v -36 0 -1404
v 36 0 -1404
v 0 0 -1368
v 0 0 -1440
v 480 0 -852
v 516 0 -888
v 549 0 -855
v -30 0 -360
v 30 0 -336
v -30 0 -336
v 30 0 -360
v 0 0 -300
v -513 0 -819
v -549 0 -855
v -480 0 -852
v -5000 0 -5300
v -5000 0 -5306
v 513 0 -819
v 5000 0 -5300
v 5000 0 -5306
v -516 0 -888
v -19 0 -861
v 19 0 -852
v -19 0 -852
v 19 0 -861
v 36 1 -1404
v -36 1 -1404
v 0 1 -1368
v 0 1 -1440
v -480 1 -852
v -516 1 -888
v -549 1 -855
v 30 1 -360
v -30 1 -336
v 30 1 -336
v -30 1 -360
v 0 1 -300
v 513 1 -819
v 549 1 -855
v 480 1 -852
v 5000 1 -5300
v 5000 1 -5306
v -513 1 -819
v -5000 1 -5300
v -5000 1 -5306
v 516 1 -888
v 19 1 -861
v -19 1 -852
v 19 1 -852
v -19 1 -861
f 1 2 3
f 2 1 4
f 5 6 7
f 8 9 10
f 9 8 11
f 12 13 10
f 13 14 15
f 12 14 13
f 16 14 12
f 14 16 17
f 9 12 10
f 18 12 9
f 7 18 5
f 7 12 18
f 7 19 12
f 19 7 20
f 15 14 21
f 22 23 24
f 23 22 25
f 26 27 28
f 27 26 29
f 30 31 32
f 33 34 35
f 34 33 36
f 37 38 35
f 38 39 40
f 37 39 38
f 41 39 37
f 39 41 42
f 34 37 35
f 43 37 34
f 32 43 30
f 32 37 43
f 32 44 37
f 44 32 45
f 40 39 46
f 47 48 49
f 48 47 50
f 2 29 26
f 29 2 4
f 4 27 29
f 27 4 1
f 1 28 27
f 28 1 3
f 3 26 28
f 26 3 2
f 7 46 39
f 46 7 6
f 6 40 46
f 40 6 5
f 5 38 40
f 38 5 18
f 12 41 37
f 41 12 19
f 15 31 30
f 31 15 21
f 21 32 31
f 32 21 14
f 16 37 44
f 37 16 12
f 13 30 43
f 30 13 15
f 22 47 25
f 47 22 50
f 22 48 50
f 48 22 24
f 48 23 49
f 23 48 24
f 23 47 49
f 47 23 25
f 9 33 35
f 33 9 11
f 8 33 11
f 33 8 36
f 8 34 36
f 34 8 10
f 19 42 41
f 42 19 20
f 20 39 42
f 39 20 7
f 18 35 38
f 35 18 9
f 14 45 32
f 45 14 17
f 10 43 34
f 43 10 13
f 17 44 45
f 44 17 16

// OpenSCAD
$fs = 120;

$vpt = [0,1080,480];
$vpr = [-34,0,0];
$vpf = 45;

foul_line = 6;
plain_color = [1,1,1,0.8];
out_color = [1,0.75,0.75,0.8];
eat_color = [0.5,0.75,1,0.8];

// home, first, second, third, rubber
color([1,1,1]) scale([1,-1,-1]) rotate([90,0,0]) linear_extrude(1) {
    polygon([[-30,30*2+300],[30,30*2+300],[30,30+300],[0,300],[-30,30+300]]);
    polygon([[552-36*2,852],[552-36,852+36],[552,852],[552-36,852-36]]);
    polygon([[0,1404+36],[36,1404],[0,1404-36],[-36,1404]]);
    polygon([[-552+36*2,852],[-552+36,852+36],[-552,852],[-552+36,852-36]]);
    polygon([[-19,852],[19,852],[19,9+852],[-19,9+852]]);
}

// foul lines
color([1,1,1,0.5]) scale([1,-1,-1]) rotate([90,0,0]) linear_extrude(1) {
    polygon([[0,300],[-5000,300+5000],[-5000,300+5000+foul_line],[0,300+foul_line]]);
    polygon([[0,300],[5000,300+5000],[5000,300+5000+foul_line],[0,300+foul_line]]);
}

scale([0.1,0.1,-0.1]) translate([-23200,0,0]) {
    color(out_color) polyhedron([[10890,0,13040],[40710,0,42630],[10890,10000,13040],[40710,10000,42630]], [[0,1,3,2]]);
    color(out_color) polyhedron([[10890,0,13040],[10890,0,13140],[10890,10000,13040],[10890,10000,13140]], [[0,1,3,2]]);
    color(out_color) polyhedron([[40710,0,42630],[40710,0,42730],[40710,10000,42630],[40710,10000,42730]], [[0,1,3,2]]);
    color(out_color) polyhedron([[10890,0,13140],[40710,0,42730],[10890,10000,13140],[40710,10000,42730]], [[0,1,3,2]]);
    color(out_color) polyhedron([[10890,10000,13040],[10890,10000,13140],[40710,10000,42630],[40710,10000,42730]], [[0,1,3,2]]);
    color(plain_color) polyhedron([[19670,0,16560],[33580,0,29730],[19670,4083,16560],[33580,4083,29730]], [[0,1,3,2]]);
    color(plain_color) polyhedron([[19670,0,16560],[15260,0,21410],[19670,4083,16560],[15260,4083,21410]], [[0,1,3,2]]);
    color(plain_color) polyhedron([[33580,0,29730],[24510,0,29290],[33580,4083,29730],[24510,4083,29290]], [[0,1,3,2]]);
    color(plain_color) polyhedron([[15260,0,21410],[24510,0,29290],[15260,4083,21410],[24510,4083,29290]], [[0,1,3,2]]);
    color(plain_color) polyhedron([[19670,4083,16560],[15260,4083,21410],[33580,4083,29730],[24510,4083,29290]], [[0,1,3,2]]);
    color(plain_color) polyhedron([[27410,0,22160],[31740,0,26870],[27410,2300,22160],[31740,2300,26870]], [[0,1,3,2]]);
    color(plain_color) polyhedron([[27410,0,22160],[26340,0,23630],[27410,2300,22160],[26340,2300,23630]], [[0,1,3,2]]);
    color(plain_color) polyhedron([[31740,0,26870],[30760,0,29430],[31740,2300,26870],[30760,2300,29430]], [[0,1,3,2]]);
    color(plain_color) polyhedron([[26340,0,23630],[30760,0,29430],[26340,2300,23630],[30760,2300,29430]], [[0,1,3,2]]);
    color(plain_color) polyhedron([[27410,2300,22160],[26340,2300,23630],[31740,2300,26870],[30760,2300,29430]], [[0,1,3,2]]);
    color(out_color) polyhedron([[36990,0,17060],[37090,0,17060],[36990,10000,17060],[37090,10000,17060]], [[0,1,3,2]]);
    color(out_color) polyhedron([[36990,0,17060],[10390,0,42630],[36990,10000,17060],[10390,10000,42630]], [[0,1,3,2]]);
    color(out_color) polyhedron([[37090,0,17060],[10290,0,42630],[37090,10000,17060],[10290,10000,42630]], [[0,1,3,2]]);
    color(out_color) polyhedron([[10390,0,42630],[10290,0,42630],[10390,10000,42630],[10290,10000,42630]], [[0,1,3,2]]);
    color(out_color) polyhedron([[36990,10000,17060],[10390,10000,42630],[37090,10000,17060],[10290,10000,42630]], [[0,1,3,2]]);
    color(plain_color) polyhedron([[27410,0,22160],[32850,0,16800],[27410,2000,22160],[32850,2000,16800]], [[0,1,3,2]]);
    color(plain_color) polyhedron([[27410,0,22160],[31740,0,26870],[27410,2000,22160],[31740,2000,26870]], [[0,1,3,2]]);
    color(plain_color) polyhedron([[32850,0,16800],[34720,0,19120],[32850,2000,16800],[34720,2000,19120]], [[0,1,3,2]]);
    color(plain_color) polyhedron([[31740,0,26870],[34720,0,19120],[31740,2000,26870],[34720,2000,19120]], [[0,1,3,2]]);
    color(plain_color) polyhedron([[27410,2000,22160],[31740,2000,26870],[32850,2000,16800],[34720,2000,19120]], [[0,1,3,2]]);
    color(plain_color) polyhedron([[35720,0,13800],[38660,0,16120],[35720,1400,13800],[38660,1400,16120]], [[0,1,3,2]]);
    color(plain_color) polyhedron([[35720,0,13800],[32850,0,16800],[35720,1400,13800],[32850,1400,16800]], [[0,1,3,2]]);
    color(plain_color) polyhedron([[38660,0,16120],[34720,0,19120],[38660,1400,16120],[34720,1400,19120]], [[0,1,3,2]]);
    color(plain_color) polyhedron([[32850,0,16800],[34720,0,19120],[32850,1400,16800],[34720,1400,19120]], [[0,1,3,2]]);
    color(plain_color) polyhedron([[35720,1400,13800],[32850,1400,16800],[38660,1400,16120],[34720,1400,19120]], [[0,1,3,2]]);
    color(plain_color) polyhedron([[30230,0,5340],[37260,0,12570],[30230,1300,5340],[37260,1300,12570]], [[0,1,3,2]]);
    color(plain_color) polyhedron([[30230,0,5340],[29440,0,8170],[30230,1300,5340],[29440,1300,8170]], [[0,1,3,2]]);
    color(plain_color) polyhedron([[37260,0,12570],[35250,0,13900],[37260,1300,12570],[35250,1300,13900]], [[0,1,3,2]]);
    color(plain_color) polyhedron([[29440,0,8170],[35250,0,13900],[29440,1300,8170],[35250,1300,13900]], [[0,1,3,2]]);
    color(plain_color) polyhedron([[30230,1300,5340],[29440,1300,8170],[37260,1300,12570],[35250,1300,13900]], [[0,1,3,2]]);
    color(plain_color) polyhedron([[29420,0,4410],[30230,0,5340],[29420,1300,4410],[30230,1300,5340]], [[0,1,3,2]]);
    color(plain_color) polyhedron([[29420,0,4410],[28520,0,6350],[29420,1300,4410],[28520,1300,6350]], [[0,1,3,2]]);
    color(plain_color) polyhedron([[30230,0,5340],[29440,0,8170],[30230,1300,5340],[29440,1300,8170]], [[0,1,3,2]]);
    color(plain_color) polyhedron([[28520,0,6350],[29440,0,8170],[28520,1300,6350],[29440,1300,8170]], [[0,1,3,2]]);
    color(plain_color) polyhedron([[29420,1300,4410],[28520,1300,6350],[30230,1300,5340],[29440,1300,8170]], [[0,1,3,2]]);
    color(out_color) polyhedron([[22580,0,1880],[22680,0,1880],[22580,1200,1880],[22680,1200,1880]], [[0,1,3,2]]);
    color(out_color) polyhedron([[22580,0,1880],[12710,0,11920],[22580,1200,1880],[12710,1200,11920]], [[0,1,3,2]]);
    color(out_color) polyhedron([[22680,0,1880],[12810,0,11920],[22680,1200,1880],[12810,1200,11920]], [[0,1,3,2]]);
    color(out_color) polyhedron([[12710,0,11920],[12810,0,11920],[12710,1200,11920],[12810,1200,11920]], [[0,1,3,2]]);
    color(out_color) polyhedron([[22580,1200,1880],[12710,1200,11920],[22680,1200,1880],[12810,1200,11920]], [[0,1,3,2]]);
    color(out_color) polyhedron([[12710,0,11920],[12810,0,11920],[12710,1200,11920],[12810,1200,11920]], [[0,1,3,2]]);
    color(out_color) polyhedron([[12710,0,11920],[10450,0,14230],[12710,1200,11920],[10450,1200,14230]], [[0,1,3,2]]);
    color(out_color) polyhedron([[12810,0,11920],[10350,0,14230],[12810,1200,11920],[10350,1200,14230]], [[0,1,3,2]]);
    color(out_color) polyhedron([[10450,0,14230],[10350,0,14230],[10450,1200,14230],[10350,1200,14230]], [[0,1,3,2]]);
    color(out_color) polyhedron([[12710,1200,11920],[10450,1200,14230],[12810,1200,11920],[10350,1200,14230]], [[0,1,3,2]]);
    color(out_color) polyhedron([[24620,0,1770],[35000,0,11630],[24620,5,1770],[35000,5,11630]], [[0,1,3,2]]);
    color(out_color) polyhedron([[24620,0,1770],[24620,0,1880],[24620,5,1770],[24620,5,1880]], [[0,1,3,2]]);
    color(out_color) polyhedron([[35000,0,11630],[35000,0,11730],[35000,5,11630],[35000,5,11730]], [[0,1,3,2]]);
    color(out_color) polyhedron([[24620,0,1880],[35000,0,11730],[24620,5,1880],[35000,5,11730]], [[0,1,3,2]]);
    color(out_color) polyhedron([[24620,5,1770],[24620,5,1880],[35000,5,11630],[35000,5,11730]], [[0,1,3,2]]);
    color(plain_color) polyhedron([[0,0,0],[0,0,0],[0,0,0],[0,0,0]], [[0,1,3,2]]);
    color(plain_color) polyhedron([[0,0,0],[0,0,0],[0,0,0],[0,0,0]], [[0,1,3,2]]);
    color(plain_color) polyhedron([[0,0,0],[0,0,0],[0,0,0],[0,0,0]], [[0,1,3,2]]);
    color(plain_color) polyhedron([[0,0,0],[0,0,0],[0,0,0],[0,0,0]], [[0,1,3,2]]);
    color(plain_color) polyhedron([[0,0,0],[0,0,0],[0,0,0],[0,0,0]], [[0,1,3,2]]);
    color(plain_color) polyhedron([[0,0,0],[0,0,0],[0,0,0],[0,0,0]], [[0,1,3,2]]);
    color(plain_color) polyhedron([[0,0,0],[0,0,0],[0,0,0],[0,0,0]], [[0,1,3,2]]);
    color(plain_color) polyhedron([[0,0,0],[0,0,0],[0,0,0],[0,0,0]], [[0,1,3,2]]);
    color(plain_color) polyhedron([[0,0,0],[0,0,0],[0,0,0],[0,0,0]], [[0,1,3,2]]);
    color(plain_color) polyhedron([[0,0,0],[0,0,0],[0,0,0],[0,0,0]], [[0,1,3,2]]);
    color(plain_color) polyhedron([[0,0,0],[0,0,0],[0,0,0],[0,0,0]], [[0,1,3,2]]);
    color(plain_color) polyhedron([[0,0,0],[0,0,0],[0,0,0],[0,0,0]], [[0,1,3,2]]);
    color(plain_color) polyhedron([[0,0,0],[0,0,0],[0,0,0],[0,0,0]], [[0,1,3,2]]);
    color(plain_color) polyhedron([[0,0,0],[0,0,0],[0,0,0],[0,0,0]], [[0,1,3,2]]);
    color(plain_color) polyhedron([[0,0,0],[0,0,0],[0,0,0],[0,0,0]], [[0,1,3,2]]);
    color(plain_color) polyhedron([[0,0,0],[0,0,0],[0,0,0],[0,0,0]], [[0,1,3,2]]);
    color(plain_color) polyhedron([[0,0,0],[0,0,0],[0,0,0],[0,0,0]], [[0,1,3,2]]);
    color(plain_color) polyhedron([[0,0,0],[0,0,0],[0,0,0],[0,0,0]], [[0,1,3,2]]);
    color(plain_color) polyhedron([[0,0,0],[0,0,0],[0,0,0],[0,0,0]], [[0,1,3,2]]);
    color(plain_color) polyhedron([[0,0,0],[0,0,0],[0,0,0],[0,0,0]], [[0,1,3,2]]);
    color(plain_color) polyhedron([[0,0,0],[0,0,0],[0,0,0],[0,0,0]], [[0,1,3,2]]);
    color(plain_color) polyhedron([[0,0,0],[0,0,0],[0,0,0],[0,0,0]], [[0,1,3,2]]);
    color(plain_color) polyhedron([[0,0,0],[0,0,0],[0,0,0],[0,0,0]], [[0,1,3,2]]);
    color(plain_color) polyhedron([[0,0,0],[0,0,0],[0,0,0],[0,0,0]], [[0,1,3,2]]);
    color(plain_color) polyhedron([[0,0,0],[0,0,0],[0,0,0],[0,0,0]], [[0,1,3,2]]);
    color(plain_color) polyhedron([[0,0,0],[0,0,0],[0,0,0],[0,0,0]], [[0,1,3,2]]);
    color(plain_color) polyhedron([[0,0,0],[0,0,0],[0,0,0],[0,0,0]], [[0,1,3,2]]);
    color(plain_color) polyhedron([[0,0,0],[0,0,0],[0,0,0],[0,0,0]], [[0,1,3,2]]);
    color(plain_color) polyhedron([[0,0,0],[0,0,0],[0,0,0],[0,0,0]], [[0,1,3,2]]);
    color(plain_color) polyhedron([[0,0,0],[0,0,0],[0,0,0],[0,0,0]], [[0,1,3,2]]);
    color(plain_color) polyhedron([[0,0,0],[0,0,0],[0,0,0],[0,0,0]], [[0,1,3,2]]);
    color(plain_color) polyhedron([[0,0,0],[0,0,0],[0,0,0],[0,0,0]], [[0,1,3,2]]);
    color(plain_color) polyhedron([[0,0,0],[0,0,0],[0,0,0],[0,0,0]], [[0,1,3,2]]);
    color(plain_color) polyhedron([[0,0,0],[0,0,0],[0,0,0],[0,0,0]], [[0,1,3,2]]);
    color(plain_color) polyhedron([[0,0,0],[0,0,0],[0,0,0],[0,0,0]], [[0,1,3,2]]);
    color(plain_color) polyhedron([[0,0,0],[0,0,0],[0,0,0],[0,0,0]], [[0,1,3,2]]);
    color(plain_color) polyhedron([[0,0,0],[0,0,0],[0,0,0],[0,0,0]], [[0,1,3,2]]);
    color(plain_color) polyhedron([[0,0,0],[0,0,0],[0,0,0],[0,0,0]], [[0,1,3,2]]);
    color(plain_color) polyhedron([[0,0,0],[0,0,0],[0,0,0],[0,0,0]], [[0,1,3,2]]);
    color(plain_color) polyhedron([[0,0,0],[0,0,0],[0,0,0],[0,0,0]], [[0,1,3,2]]);
    color(plain_color) polyhedron([[0,0,0],[0,0,0],[0,0,0],[0,0,0]], [[0,1,3,2]]);
    color(plain_color) polyhedron([[0,0,0],[0,0,0],[0,0,0],[0,0,0]], [[0,1,3,2]]);
    color(plain_color) polyhedron([[0,0,0],[0,0,0],[0,0,0],[0,0,0]], [[0,1,3,2]]);
    color(plain_color) polyhedron([[0,0,0],[0,0,0],[0,0,0],[0,0,0]], [[0,1,3,2]]);
    color(plain_color) polyhedron([[0,0,0],[0,0,0],[0,0,0],[0,0,0]], [[0,1,3,2]]);
    color(plain_color) polyhedron([[0,0,0],[0,0,0],[0,0,0],[0,0,0]], [[0,1,3,2]]);
    color(plain_color) polyhedron([[0,0,0],[0,0,0],[0,0,0],[0,0,0]], [[0,1,3,2]]);
    color(plain_color) polyhedron([[0,0,0],[0,0,0],[0,0,0],[0,0,0]], [[0,1,3,2]]);
    color(plain_color) polyhedron([[0,0,0],[0,0,0],[0,0,0],[0,0,0]], [[0,1,3,2]]);
    color(plain_color) polyhedron([[0,0,0],[0,0,0],[0,0,0],[0,0,0]], [[0,1,3,2]]);
    color(plain_color) polyhedron([[0,0,0],[0,0,0],[0,0,0],[0,0,0]], [[0,1,3,2]]);
    color(plain_color) polyhedron([[0,0,0],[0,0,0],[0,0,0],[0,0,0]], [[0,1,3,2]]);
    color(plain_color) polyhedron([[0,0,0],[0,0,0],[0,0,0],[0,0,0]], [[0,1,3,2]]);
    color(plain_color) polyhedron([[0,0,0],[0,0,0],[0,0,0],[0,0,0]], [[0,1,3,2]]);
    color(plain_color) polyhedron([[0,0,0],[0,0,0],[0,0,0],[0,0,0]], [[0,1,3,2]]);
    color(plain_color) polyhedron([[0,0,0],[0,0,0],[0,0,0],[0,0,0]], [[0,1,3,2]]);
    color(plain_color) polyhedron([[0,0,0],[0,0,0],[0,0,0],[0,0,0]], [[0,1,3,2]]);
    color(plain_color) polyhedron([[0,0,0],[0,0,0],[0,0,0],[0,0,0]], [[0,1,3,2]]);
    color(plain_color) polyhedron([[0,0,0],[0,0,0],[0,0,0],[0,0,0]], [[0,1,3,2]]);
    color(plain_color) polyhedron([[0,0,0],[0,0,0],[0,0,0],[0,0,0]], [[0,1,3,2]]);
    color(plain_color) polyhedron([[0,0,0],[0,0,0],[0,0,0],[0,0,0]], [[0,1,3,2]]);
    color(plain_color) polyhedron([[0,0,0],[0,0,0],[0,0,0],[0,0,0]], [[0,1,3,2]]);
    color(plain_color) polyhedron([[0,0,0],[0,0,0],[0,0,0],[0,0,0]], [[0,1,3,2]]);
    color(plain_color) polyhedron([[0,0,0],[0,0,0],[0,0,0],[0,0,0]], [[0,1,3,2]]);
    color(plain_color) polyhedron([[0,0,0],[0,0,0],[0,0,0],[0,0,0]], [[0,1,3,2]]);
    color(plain_color) polyhedron([[0,0,0],[0,0,0],[0,0,0],[0,0,0]], [[0,1,3,2]]);
    color(plain_color) polyhedron([[0,0,0],[0,0,0],[0,0,0],[0,0,0]], [[0,1,3,2]]);
    color(plain_color) polyhedron([[0,0,0],[0,0,0],[0,0,0],[0,0,0]], [[0,1,3,2]]);
    color(plain_color) polyhedron([[0,0,0],[0,0,0],[0,0,0],[0,0,0]], [[0,1,3,2]]);
    color(plain_color) polyhedron([[0,0,0],[0,0,0],[0,0,0],[0,0,0]], [[0,1,3,2]]);
    color(plain_color) polyhedron([[0,0,0],[0,0,0],[0,0,0],[0,0,0]], [[0,1,3,2]]);
    color(plain_color) polyhedron([[0,0,0],[0,0,0],[0,0,0],[0,0,0]], [[0,1,3,2]]);
    color(plain_color) polyhedron([[0,0,0],[0,0,0],[0,0,0],[0,0,0]], [[0,1,3,2]]);
    color(plain_color) polyhedron([[0,0,0],[0,0,0],[0,0,0],[0,0,0]], [[0,1,3,2]]);
    color(plain_color) polyhedron([[0,0,0],[0,0,0],[0,0,0],[0,0,0]], [[0,1,3,2]]);
    color(plain_color) polyhedron([[0,0,0],[0,0,0],[0,0,0],[0,0,0]], [[0,1,3,2]]);
    color(plain_color) polyhedron([[0,0,0],[0,0,0],[0,0,0],[0,0,0]], [[0,1,3,2]]);
    color(plain_color) polyhedron([[0,0,0],[0,0,0],[0,0,0],[0,0,0]], [[0,1,3,2]]);
    color(plain_color) polyhedron([[0,0,0],[0,0,0],[0,0,0],[0,0,0]], [[0,1,3,2]]);
    color(plain_color) polyhedron([[0,0,0],[0,0,0],[0,0,0],[0,0,0]], [[0,1,3,2]]);
    color(plain_color) polyhedron([[0,0,0],[0,0,0],[0,0,0],[0,0,0]], [[0,1,3,2]]);
    color(plain_color) polyhedron([[0,0,0],[0,0,0],[0,0,0],[0,0,0]], [[0,1,3,2]]);
    color(plain_color) polyhedron([[0,0,0],[0,0,0],[0,0,0],[0,0,0]], [[0,1,3,2]]);
    color(plain_color) polyhedron([[0,0,0],[0,0,0],[0,0,0],[0,0,0]], [[0,1,3,2]]);
    color(plain_color) polyhedron([[0,0,0],[0,0,0],[0,0,0],[0,0,0]], [[0,1,3,2]]);
    color(plain_color) polyhedron([[0,0,0],[0,0,0],[0,0,0],[0,0,0]], [[0,1,3,2]]);
    color(plain_color) polyhedron([[0,0,0],[0,0,0],[0,0,0],[0,0,0]], [[0,1,3,2]]);
    color(plain_color) polyhedron([[0,0,0],[0,0,0],[0,0,0],[0,0,0]], [[0,1,3,2]]);
    color(plain_color) polyhedron([[0,0,0],[0,0,0],[0,0,0],[0,0,0]], [[0,1,3,2]]);
    color(plain_color) polyhedron([[0,0,0],[0,0,0],[0,0,0],[0,0,0]], [[0,1,3,2]]);
    color(plain_color) polyhedron([[0,0,0],[0,0,0],[0,0,0],[0,0,0]], [[0,1,3,2]]);
    color(plain_color) polyhedron([[0,0,0],[0,0,0],[0,0,0],[0,0,0]], [[0,1,3,2]]);
    color(plain_color) polyhedron([[0,0,0],[0,0,0],[0,0,0],[0,0,0]], [[0,1,3,2]]);
    color(plain_color) polyhedron([[0,0,0],[0,0,0],[0,0,0],[0,0,0]], [[0,1,3,2]]);
    color(plain_color) polyhedron([[0,0,0],[0,0,0],[0,0,0],[0,0,0]], [[0,1,3,2]]);
    color(plain_color) polyhedron([[0,0,0],[0,0,0],[0,0,0],[0,0,0]], [[0,1,3,2]]);
    color(plain_color) polyhedron([[0,0,0],[0,0,0],[0,0,0],[0,0,0]], [[0,1,3,2]]);
    color(plain_color) polyhedron([[0,0,0],[0,0,0],[0,0,0],[0,0,0]], [[0,1,3,2]]);
    color(plain_color) polyhedron([[0,0,0],[0,0,0],[0,0,0],[0,0,0]], [[0,1,3,2]]);
    color(plain_color) polyhedron([[0,0,0],[0,0,0],[0,0,0],[0,0,0]], [[0,1,3,2]]);
    color(plain_color) polyhedron([[0,0,0],[0,0,0],[0,0,0],[0,0,0]], [[0,1,3,2]]);
    color(plain_color) polyhedron([[0,0,0],[0,0,0],[0,0,0],[0,0,0]], [[0,1,3,2]]);
    color(plain_color) polyhedron([[0,0,0],[0,0,0],[0,0,0],[0,0,0]], [[0,1,3,2]]);
    color(plain_color) polyhedron([[0,0,0],[0,0,0],[0,0,0],[0,0,0]], [[0,1,3,2]]);
    color(plain_color) polyhedron([[0,0,0],[0,0,0],[0,0,0],[0,0,0]], [[0,1,3,2]]);
    color(plain_color) polyhedron([[0,0,0],[0,0,0],[0,0,0],[0,0,0]], [[0,1,3,2]]);
    color(plain_color) polyhedron([[0,0,0],[0,0,0],[0,0,0],[0,0,0]], [[0,1,3,2]]);
    color(plain_color) polyhedron([[0,0,0],[0,0,0],[0,0,0],[0,0,0]], [[0,1,3,2]]);
    color(plain_color) polyhedron([[0,0,0],[0,0,0],[0,0,0],[0,0,0]], [[0,1,3,2]]);
    color(plain_color) polyhedron([[0,0,0],[0,0,0],[0,0,0],[0,0,0]], [[0,1,3,2]]);
    color(plain_color) polyhedron([[0,0,0],[0,0,0],[0,0,0],[0,0,0]], [[0,1,3,2]]);
    color(plain_color) polyhedron([[0,0,0],[0,0,0],[0,0,0],[0,0,0]], [[0,1,3,2]]);
    color(plain_color) polyhedron([[0,0,0],[0,0,0],[0,0,0],[0,0,0]], [[0,1,3,2]]);
    color(plain_color) polyhedron([[0,0,0],[0,0,0],[0,0,0],[0,0,0]], [[0,1,3,2]]);
    color(plain_color) polyhedron([[0,0,0],[0,0,0],[0,0,0],[0,0,0]], [[0,1,3,2]]);
    color(plain_color) polyhedron([[0,0,0],[0,0,0],[0,0,0],[0,0,0]], [[0,1,3,2]]);
    color(plain_color) polyhedron([[0,0,0],[0,0,0],[0,0,0],[0,0,0]], [[0,1,3,2]]);
    color(plain_color) polyhedron([[0,0,0],[0,0,0],[0,0,0],[0,0,0]], [[0,1,3,2]]);
    color(plain_color) polyhedron([[0,0,0],[0,0,0],[0,0,0],[0,0,0]], [[0,1,3,2]]);
    color(plain_color) polyhedron([[0,0,0],[0,0,0],[0,0,0],[0,0,0]], [[0,1,3,2]]);
    color(plain_color) polyhedron([[0,0,0],[0,0,0],[0,0,0],[0,0,0]], [[0,1,3,2]]);
    color(plain_color) polyhedron([[0,0,0],[0,0,0],[0,0,0],[0,0,0]], [[0,1,3,2]]);
    color(plain_color) polyhedron([[0,0,0],[0,0,0],[0,0,0],[0,0,0]], [[0,1,3,2]]);
    color(plain_color) polyhedron([[0,0,0],[0,0,0],[0,0,0],[0,0,0]], [[0,1,3,2]]);
    color(plain_color) polyhedron([[0,0,0],[0,0,0],[0,0,0],[0,0,0]], [[0,1,3,2]]);
    color(plain_color) polyhedron([[0,0,0],[0,0,0],[0,0,0],[0,0,0]], [[0,1,3,2]]);
    color(plain_color) polyhedron([[0,0,0],[0,0,0],[0,0,0],[0,0,0]], [[0,1,3,2]]);
    color(plain_color) polyhedron([[0,0,0],[0,0,0],[0,0,0],[0,0,0]], [[0,1,3,2]]);
    color(plain_color) polyhedron([[0,0,0],[0,0,0],[0,0,0],[0,0,0]], [[0,1,3,2]]);
    color(plain_color) polyhedron([[0,0,0],[0,0,0],[0,0,0],[0,0,0]], [[0,1,3,2]]);
    color(plain_color) polyhedron([[0,0,0],[0,0,0],[0,0,0],[0,0,0]], [[0,1,3,2]]);
    color(plain_color) polyhedron([[0,0,0],[0,0,0],[0,0,0],[0,0,0]], [[0,1,3,2]]);
    color(plain_color) polyhedron([[0,0,0],[0,0,0],[0,0,0],[0,0,0]], [[0,1,3,2]]);
    color(plain_color) polyhedron([[0,0,0],[0,0,0],[0,0,0],[0,0,0]], [[0,1,3,2]]);
    color(plain_color) polyhedron([[0,0,0],[0,0,0],[0,0,0],[0,0,0]], [[0,1,3,2]]);
    color(plain_color) polyhedron([[0,0,0],[0,0,0],[0,0,0],[0,0,0]], [[0,1,3,2]]);
    color(plain_color) polyhedron([[0,0,0],[0,0,0],[0,0,0],[0,0,0]], [[0,1,3,2]]);
    color(plain_color) polyhedron([[0,0,0],[0,0,0],[0,0,0],[0,0,0]], [[0,1,3,2]]);
    color(plain_color) polyhedron([[0,0,0],[0,0,0],[0,0,0],[0,0,0]], [[0,1,3,2]]);
    color(plain_color) polyhedron([[0,0,0],[0,0,0],[0,0,0],[0,0,0]], [[0,1,3,2]]);
    color(plain_color) polyhedron([[0,0,0],[0,0,0],[0,0,0],[0,0,0]], [[0,1,3,2]]);
    color(plain_color) polyhedron([[0,0,0],[0,0,0],[0,0,0],[0,0,0]], [[0,1,3,2]]);
    color(plain_color) polyhedron([[0,0,0],[0,0,0],[0,0,0],[0,0,0]], [[0,1,3,2]]);
    color(plain_color) polyhedron([[0,0,0],[0,0,0],[0,0,0],[0,0,0]], [[0,1,3,2]]);
    color(plain_color) polyhedron([[0,0,0],[0,0,0],[0,0,0],[0,0,0]], [[0,1,3,2]]);
    color(plain_color) polyhedron([[0,0,0],[0,0,0],[0,0,0],[0,0,0]], [[0,1,3,2]]);
    color(plain_color) polyhedron([[0,0,0],[0,0,0],[0,0,0],[0,0,0]], [[0,1,3,2]]);
    color(plain_color) polyhedron([[0,0,0],[0,0,0],[0,0,0],[0,0,0]], [[0,1,3,2]]);
    color(plain_color) polyhedron([[0,0,0],[0,0,0],[0,0,0],[0,0,0]], [[0,1,3,2]]);
    color(plain_color) polyhedron([[0,0,0],[0,0,0],[0,0,0],[0,0,0]], [[0,1,3,2]]);
    color(plain_color) polyhedron([[0,0,0],[0,0,0],[0,0,0],[0,0,0]], [[0,1,3,2]]);
    color(plain_color) polyhedron([[0,0,0],[0,0,0],[0,0,0],[0,0,0]], [[0,1,3,2]]);
    color(plain_color) polyhedron([[0,0,0],[0,0,0],[0,0,0],[0,0,0]], [[0,1,3,2]]);
    color(plain_color) polyhedron([[0,0,0],[0,0,0],[0,0,0],[0,0,0]], [[0,1,3,2]]);
    color(plain_color) polyhedron([[0,0,0],[0,0,0],[0,0,0],[0,0,0]], [[0,1,3,2]]);
    color(plain_color) polyhedron([[0,0,0],[0,0,0],[0,0,0],[0,0,0]], [[0,1,3,2]]);
    color(plain_color) polyhedron([[0,0,0],[0,0,0],[0,0,0],[0,0,0]], [[0,1,3,2]]);
    color(plain_color) polyhedron([[0,0,0],[0,0,0],[0,0,0],[0,0,0]], [[0,1,3,2]]);
    color(plain_color) polyhedron([[0,0,0],[0,0,0],[0,0,0],[0,0,0]], [[0,1,3,2]]);
    color(plain_color) polyhedron([[0,0,0],[0,0,0],[0,0,0],[0,0,0]], [[0,1,3,2]]);
    color(plain_color) polyhedron([[0,0,0],[0,0,0],[0,0,0],[0,0,0]], [[0,1,3,2]]);
    color(plain_color) polyhedron([[0,0,0],[0,0,0],[0,0,0],[0,0,0]], [[0,1,3,2]]);
    color(plain_color) polyhedron([[0,0,0],[0,0,0],[0,0,0],[0,0,0]], [[0,1,3,2]]);
    color(plain_color) polyhedron([[0,0,0],[0,0,0],[0,0,0],[0,0,0]], [[0,1,3,2]]);
    color(plain_color) polyhedron([[0,0,0],[0,0,0],[0,0,0],[0,0,0]], [[0,1,3,2]]);
    color(plain_color) polyhedron([[0,0,0],[0,0,0],[0,0,0],[0,0,0]], [[0,1,3,2]]);
    color(plain_color) polyhedron([[0,0,0],[0,0,0],[0,0,0],[0,0,0]], [[0,1,3,2]]);
    color(plain_color) polyhedron([[0,0,0],[0,0,0],[0,0,0],[0,0,0]], [[0,1,3,2]]);
    color(plain_color) polyhedron([[0,0,0],[0,0,0],[0,0,0],[0,0,0]], [[0,1,3,2]]);
    color(plain_color) polyhedron([[0,0,0],[0,0,0],[0,0,0],[0,0,0]], [[0,1,3,2]]);
    color(plain_color) polyhedron([[0,0,0],[0,0,0],[0,0,0],[0,0,0]], [[0,1,3,2]]);
    color(plain_color) polyhedron([[0,0,0],[0,0,0],[0,0,0],[0,0,0]], [[0,1,3,2]]);
    color(plain_color) polyhedron([[0,0,0],[0,0,0],[0,0,0],[0,0,0]], [[0,1,3,2]]);
    color(plain_color) polyhedron([[0,0,0],[0,0,0],[0,0,0],[0,0,0]], [[0,1,3,2]]);
    color(plain_color) polyhedron([[0,0,0],[0,0,0],[0,0,0],[0,0,0]], [[0,1,3,2]]);
    color(plain_color) polyhedron([[0,0,0],[0,0,0],[0,0,0],[0,0,0]], [[0,1,3,2]]);
    color(plain_color) polyhedron([[0,0,0],[0,0,0],[0,0,0],[0,0,0]], [[0,1,3,2]]);
    color(plain_color) polyhedron([[0,0,0],[0,0,0],[0,0,0],[0,0,0]], [[0,1,3,2]]);
    color(plain_color) polyhedron([[0,0,0],[0,0,0],[0,0,0],[0,0,0]], [[0,1,3,2]]);
    color(plain_color) polyhedron([[0,0,0],[0,0,0],[0,0,0],[0,0,0]], [[0,1,3,2]]);
    color(plain_color) polyhedron([[0,0,0],[0,0,0],[0,0,0],[0,0,0]], [[0,1,3,2]]);
    color(plain_color) polyhedron([[0,0,0],[0,0,0],[0,0,0],[0,0,0]], [[0,1,3,2]]);
    color(plain_color) polyhedron([[0,0,0],[0,0,0],[0,0,0],[0,0,0]], [[0,1,3,2]]);
    color(plain_color) polyhedron([[0,0,0],[0,0,0],[0,0,0],[0,0,0]], [[0,1,3,2]]);
    color(plain_color) polyhedron([[0,0,0],[0,0,0],[0,0,0],[0,0,0]], [[0,1,3,2]]);
    color(plain_color) polyhedron([[0,0,0],[0,0,0],[0,0,0],[0,0,0]], [[0,1,3,2]]);
    color(plain_color) polyhedron([[0,0,0],[0,0,0],[0,0,0],[0,0,0]], [[0,1,3,2]]);
    color(plain_color) polyhedron([[0,0,0],[0,0,0],[0,0,0],[0,0,0]], [[0,1,3,2]]);
    color(plain_color) polyhedron([[0,0,0],[0,0,0],[0,0,0],[0,0,0]], [[0,1,3,2]]);
    color(plain_color) polyhedron([[0,0,0],[0,0,0],[0,0,0],[0,0,0]], [[0,1,3,2]]);
    color(plain_color) polyhedron([[0,0,0],[0,0,0],[0,0,0],[0,0,0]], [[0,1,3,2]]);
    color(plain_color) polyhedron([[0,0,0],[0,0,0],[0,0,0],[0,0,0]], [[0,1,3,2]]);
    color(plain_color) polyhedron([[0,0,0],[0,0,0],[0,0,0],[0,0,0]], [[0,1,3,2]]);
    color(plain_color) polyhedron([[0,0,0],[0,0,0],[0,0,0],[0,0,0]], [[0,1,3,2]]);
    color(plain_color) polyhedron([[0,0,0],[0,0,0],[0,0,0],[0,0,0]], [[0,1,3,2]]);
    color(plain_color) polyhedron([[0,0,0],[0,0,0],[0,0,0],[0,0,0]], [[0,1,3,2]]);
    color(plain_color) polyhedron([[0,0,0],[0,0,0],[0,0,0],[0,0,0]], [[0,1,3,2]]);
    color(plain_color) polyhedron([[0,0,0],[0,0,0],[0,0,0],[0,0,0]], [[0,1,3,2]]);
    color(plain_color) polyhedron([[0,0,0],[0,0,0],[0,0,0],[0,0,0]], [[0,1,3,2]]);
    color(plain_color) polyhedron([[0,0,0],[0,0,0],[0,0,0],[0,0,0]], [[0,1,3,2]]);
    color(plain_color) polyhedron([[0,0,0],[0,0,0],[0,0,0],[0,0,0]], [[0,1,3,2]]);
    color(plain_color) polyhedron([[0,0,0],[0,0,0],[0,0,0],[0,0,0]], [[0,1,3,2]]);
    color(plain_color) polyhedron([[0,0,0],[0,0,0],[0,0,0],[0,0,0]], [[0,1,3,2]]);
    color(plain_color) polyhedron([[0,0,0],[0,0,0],[0,0,0],[0,0,0]], [[0,1,3,2]]);
    color(plain_color) polyhedron([[0,0,0],[0,0,0],[0,0,0],[0,0,0]], [[0,1,3,2]]);
    color(plain_color) polyhedron([[0,0,0],[0,0,0],[0,0,0],[0,0,0]], [[0,1,3,2]]);
    color(plain_color) polyhedron([[0,0,0],[0,0,0],[0,0,0],[0,0,0]], [[0,1,3,2]]);
    color(plain_color) polyhedron([[0,0,0],[0,0,0],[0,0,0],[0,0,0]], [[0,1,3,2]]);
    color(plain_color) polyhedron([[0,0,0],[0,0,0],[0,0,0],[0,0,0]], [[0,1,3,2]]);
    color(plain_color) polyhedron([[0,0,0],[0,0,0],[0,0,0],[0,0,0]], [[0,1,3,2]]);
    color(plain_color) polyhedron([[0,0,0],[0,0,0],[0,0,0],[0,0,0]], [[0,1,3,2]]);
    color(plain_color) polyhedron([[0,0,0],[0,0,0],[0,0,0],[0,0,0]], [[0,1,3,2]]);
    color(plain_color) polyhedron([[0,0,0],[0,0,0],[0,0,0],[0,0,0]], [[0,1,3,2]]);
    color(plain_color) polyhedron([[0,0,0],[0,0,0],[0,0,0],[0,0,0]], [[0,1,3,2]]);
    color(plain_color) polyhedron([[0,0,0],[0,0,0],[0,0,0],[0,0,0]], [[0,1,3,2]]);
    color(plain_color) polyhedron([[0,0,0],[0,0,0],[0,0,0],[0,0,0]], [[0,1,3,2]]);
    color(plain_color) polyhedron([[0,0,0],[0,0,0],[0,0,0],[0,0,0]], [[0,1,3,2]]);
    color(plain_color) polyhedron([[0,0,0],[0,0,0],[0,0,0],[0,0,0]], [[0,1,3,2]]);
    color(plain_color) polyhedron([[0,0,0],[0,0,0],[0,0,0],[0,0,0]], [[0,1,3,2]]);
    color(plain_color) polyhedron([[0,0,0],[0,0,0],[0,0,0],[0,0,0]], [[0,1,3,2]]);
    color(plain_color) polyhedron([[0,0,0],[0,0,0],[0,0,0],[0,0,0]], [[0,1,3,2]]);
    color(plain_color) polyhedron([[0,0,0],[0,0,0],[0,0,0],[0,0,0]], [[0,1,3,2]]);
    color(plain_color) polyhedron([[0,0,0],[0,0,0],[0,0,0],[0,0,0]], [[0,1,3,2]]);
    color(plain_color) polyhedron([[0,0,0],[0,0,0],[0,0,0],[0,0,0]], [[0,1,3,2]]);
    color(plain_color) polyhedron([[0,0,0],[0,0,0],[0,0,0],[0,0,0]], [[0,1,3,2]]);
    color(plain_color) polyhedron([[0,0,0],[0,0,0],[0,0,0],[0,0,0]], [[0,1,3,2]]);
    color(plain_color) polyhedron([[0,0,0],[0,0,0],[0,0,0],[0,0,0]], [[0,1,3,2]]);
    color(plain_color) polyhedron([[0,0,0],[0,0,0],[0,0,0],[0,0,0]], [[0,1,3,2]]);
    color(plain_color) polyhedron([[0,0,0],[0,0,0],[0,0,0],[0,0,0]], [[0,1,3,2]]);
    color(plain_color) polyhedron([[0,0,0],[0,0,0],[0,0,0],[0,0,0]], [[0,1,3,2]]);
    color(plain_color) polyhedron([[0,0,0],[0,0,0],[0,0,0],[0,0,0]], [[0,1,3,2]]);
    color(plain_color) polyhedron([[0,0,0],[0,0,0],[0,0,0],[0,0,0]], [[0,1,3,2]]);
    color(plain_color) polyhedron([[0,0,0],[0,0,0],[0,0,0],[0,0,0]], [[0,1,3,2]]);
    color(plain_color) polyhedron([[0,0,0],[0,0,0],[0,0,0],[0,0,0]], [[0,1,3,2]]);
    color(plain_color) polyhedron([[0,0,0],[0,0,0],[0,0,0],[0,0,0]], [[0,1,3,2]]);
    color(plain_color) polyhedron([[0,0,0],[0,0,0],[0,0,0],[0,0,0]], [[0,1,3,2]]);
    color(plain_color) polyhedron([[0,0,0],[0,0,0],[0,0,0],[0,0,0]], [[0,1,3,2]]);
    color(plain_color) polyhedron([[0,0,0],[0,0,0],[0,0,0],[0,0,0]], [[0,1,3,2]]);
    color(plain_color) polyhedron([[0,0,0],[0,0,0],[0,0,0],[0,0,0]], [[0,1,3,2]]);
    color(plain_color) polyhedron([[0,0,0],[0,0,0],[0,0,0],[0,0,0]], [[0,1,3,2]]);
    color(plain_color) polyhedron([[0,0,0],[0,0,0],[0,0,0],[0,0,0]], [[0,1,3,2]]);
    color(plain_color) polyhedron([[0,0,0],[0,0,0],[0,0,0],[0,0,0]], [[0,1,3,2]]);
    color(plain_color) polyhedron([[0,0,0],[0,0,0],[0,0,0],[0,0,0]], [[0,1,3,2]]);
    color(plain_color) polyhedron([[0,0,0],[0,0,0],[0,0,0],[0,0,0]], [[0,1,3,2]]);
    color(plain_color) polyhedron([[0,0,0],[0,0,0],[0,0,0],[0,0,0]], [[0,1,3,2]]);
    color(plain_color) polyhedron([[0,0,0],[0,0,0],[0,0,0],[0,0,0]], [[0,1,3,2]]);
    color(plain_color) polyhedron([[0,0,0],[0,0,0],[0,0,0],[0,0,0]], [[0,1,3,2]]);
    color(plain_color) polyhedron([[0,0,0],[0,0,0],[0,0,0],[0,0,0]], [[0,1,3,2]]);
    color(plain_color) polyhedron([[0,0,0],[0,0,0],[0,0,0],[0,0,0]], [[0,1,3,2]]);
    color(plain_color) polyhedron([[0,0,0],[0,0,0],[0,0,0],[0,0,0]], [[0,1,3,2]]);
    color(plain_color) polyhedron([[0,0,0],[0,0,0],[0,0,0],[0,0,0]], [[0,1,3,2]]);
    color(plain_color) polyhedron([[0,0,0],[0,0,0],[0,0,0],[0,0,0]], [[0,1,3,2]]);
    color(plain_color) polyhedron([[0,0,0],[0,0,0],[0,0,0],[0,0,0]], [[0,1,3,2]]);
    color(plain_color) polyhedron([[0,0,0],[0,0,0],[0,0,0],[0,0,0]], [[0,1,3,2]]);
    color(plain_color) polyhedron([[0,0,0],[0,0,0],[0,0,0],[0,0,0]], [[0,1,3,2]]);
    color(plain_color) polyhedron([[0,0,0],[0,0,0],[0,0,0],[0,0,0]], [[0,1,3,2]]);
    color(plain_color) polyhedron([[0,0,0],[0,0,0],[0,0,0],[0,0,0]], [[0,1,3,2]]);
    color(plain_color) polyhedron([[0,0,0],[0,0,0],[0,0,0],[0,0,0]], [[0,1,3,2]]);
    color(plain_color) polyhedron([[0,0,0],[0,0,0],[0,0,0],[0,0,0]], [[0,1,3,2]]);
    color(plain_color) polyhedron([[0,0,0],[0,0,0],[0,0,0],[0,0,0]], [[0,1,3,2]]);
    color(plain_color) polyhedron([[0,0,0],[0,0,0],[0,0,0],[0,0,0]], [[0,1,3,2]]);
    color(plain_color) polyhedron([[0,0,0],[0,0,0],[0,0,0],[0,0,0]], [[0,1,3,2]]);
    color(plain_color) polyhedron([[0,0,0],[0,0,0],[0,0,0],[0,0,0]], [[0,1,3,2]]);
    color(plain_color) polyhedron([[0,0,0],[0,0,0],[0,0,0],[0,0,0]], [[0,1,3,2]]);
    color(plain_color) polyhedron([[0,0,0],[0,0,0],[0,0,0],[0,0,0]], [[0,1,3,2]]);
}
